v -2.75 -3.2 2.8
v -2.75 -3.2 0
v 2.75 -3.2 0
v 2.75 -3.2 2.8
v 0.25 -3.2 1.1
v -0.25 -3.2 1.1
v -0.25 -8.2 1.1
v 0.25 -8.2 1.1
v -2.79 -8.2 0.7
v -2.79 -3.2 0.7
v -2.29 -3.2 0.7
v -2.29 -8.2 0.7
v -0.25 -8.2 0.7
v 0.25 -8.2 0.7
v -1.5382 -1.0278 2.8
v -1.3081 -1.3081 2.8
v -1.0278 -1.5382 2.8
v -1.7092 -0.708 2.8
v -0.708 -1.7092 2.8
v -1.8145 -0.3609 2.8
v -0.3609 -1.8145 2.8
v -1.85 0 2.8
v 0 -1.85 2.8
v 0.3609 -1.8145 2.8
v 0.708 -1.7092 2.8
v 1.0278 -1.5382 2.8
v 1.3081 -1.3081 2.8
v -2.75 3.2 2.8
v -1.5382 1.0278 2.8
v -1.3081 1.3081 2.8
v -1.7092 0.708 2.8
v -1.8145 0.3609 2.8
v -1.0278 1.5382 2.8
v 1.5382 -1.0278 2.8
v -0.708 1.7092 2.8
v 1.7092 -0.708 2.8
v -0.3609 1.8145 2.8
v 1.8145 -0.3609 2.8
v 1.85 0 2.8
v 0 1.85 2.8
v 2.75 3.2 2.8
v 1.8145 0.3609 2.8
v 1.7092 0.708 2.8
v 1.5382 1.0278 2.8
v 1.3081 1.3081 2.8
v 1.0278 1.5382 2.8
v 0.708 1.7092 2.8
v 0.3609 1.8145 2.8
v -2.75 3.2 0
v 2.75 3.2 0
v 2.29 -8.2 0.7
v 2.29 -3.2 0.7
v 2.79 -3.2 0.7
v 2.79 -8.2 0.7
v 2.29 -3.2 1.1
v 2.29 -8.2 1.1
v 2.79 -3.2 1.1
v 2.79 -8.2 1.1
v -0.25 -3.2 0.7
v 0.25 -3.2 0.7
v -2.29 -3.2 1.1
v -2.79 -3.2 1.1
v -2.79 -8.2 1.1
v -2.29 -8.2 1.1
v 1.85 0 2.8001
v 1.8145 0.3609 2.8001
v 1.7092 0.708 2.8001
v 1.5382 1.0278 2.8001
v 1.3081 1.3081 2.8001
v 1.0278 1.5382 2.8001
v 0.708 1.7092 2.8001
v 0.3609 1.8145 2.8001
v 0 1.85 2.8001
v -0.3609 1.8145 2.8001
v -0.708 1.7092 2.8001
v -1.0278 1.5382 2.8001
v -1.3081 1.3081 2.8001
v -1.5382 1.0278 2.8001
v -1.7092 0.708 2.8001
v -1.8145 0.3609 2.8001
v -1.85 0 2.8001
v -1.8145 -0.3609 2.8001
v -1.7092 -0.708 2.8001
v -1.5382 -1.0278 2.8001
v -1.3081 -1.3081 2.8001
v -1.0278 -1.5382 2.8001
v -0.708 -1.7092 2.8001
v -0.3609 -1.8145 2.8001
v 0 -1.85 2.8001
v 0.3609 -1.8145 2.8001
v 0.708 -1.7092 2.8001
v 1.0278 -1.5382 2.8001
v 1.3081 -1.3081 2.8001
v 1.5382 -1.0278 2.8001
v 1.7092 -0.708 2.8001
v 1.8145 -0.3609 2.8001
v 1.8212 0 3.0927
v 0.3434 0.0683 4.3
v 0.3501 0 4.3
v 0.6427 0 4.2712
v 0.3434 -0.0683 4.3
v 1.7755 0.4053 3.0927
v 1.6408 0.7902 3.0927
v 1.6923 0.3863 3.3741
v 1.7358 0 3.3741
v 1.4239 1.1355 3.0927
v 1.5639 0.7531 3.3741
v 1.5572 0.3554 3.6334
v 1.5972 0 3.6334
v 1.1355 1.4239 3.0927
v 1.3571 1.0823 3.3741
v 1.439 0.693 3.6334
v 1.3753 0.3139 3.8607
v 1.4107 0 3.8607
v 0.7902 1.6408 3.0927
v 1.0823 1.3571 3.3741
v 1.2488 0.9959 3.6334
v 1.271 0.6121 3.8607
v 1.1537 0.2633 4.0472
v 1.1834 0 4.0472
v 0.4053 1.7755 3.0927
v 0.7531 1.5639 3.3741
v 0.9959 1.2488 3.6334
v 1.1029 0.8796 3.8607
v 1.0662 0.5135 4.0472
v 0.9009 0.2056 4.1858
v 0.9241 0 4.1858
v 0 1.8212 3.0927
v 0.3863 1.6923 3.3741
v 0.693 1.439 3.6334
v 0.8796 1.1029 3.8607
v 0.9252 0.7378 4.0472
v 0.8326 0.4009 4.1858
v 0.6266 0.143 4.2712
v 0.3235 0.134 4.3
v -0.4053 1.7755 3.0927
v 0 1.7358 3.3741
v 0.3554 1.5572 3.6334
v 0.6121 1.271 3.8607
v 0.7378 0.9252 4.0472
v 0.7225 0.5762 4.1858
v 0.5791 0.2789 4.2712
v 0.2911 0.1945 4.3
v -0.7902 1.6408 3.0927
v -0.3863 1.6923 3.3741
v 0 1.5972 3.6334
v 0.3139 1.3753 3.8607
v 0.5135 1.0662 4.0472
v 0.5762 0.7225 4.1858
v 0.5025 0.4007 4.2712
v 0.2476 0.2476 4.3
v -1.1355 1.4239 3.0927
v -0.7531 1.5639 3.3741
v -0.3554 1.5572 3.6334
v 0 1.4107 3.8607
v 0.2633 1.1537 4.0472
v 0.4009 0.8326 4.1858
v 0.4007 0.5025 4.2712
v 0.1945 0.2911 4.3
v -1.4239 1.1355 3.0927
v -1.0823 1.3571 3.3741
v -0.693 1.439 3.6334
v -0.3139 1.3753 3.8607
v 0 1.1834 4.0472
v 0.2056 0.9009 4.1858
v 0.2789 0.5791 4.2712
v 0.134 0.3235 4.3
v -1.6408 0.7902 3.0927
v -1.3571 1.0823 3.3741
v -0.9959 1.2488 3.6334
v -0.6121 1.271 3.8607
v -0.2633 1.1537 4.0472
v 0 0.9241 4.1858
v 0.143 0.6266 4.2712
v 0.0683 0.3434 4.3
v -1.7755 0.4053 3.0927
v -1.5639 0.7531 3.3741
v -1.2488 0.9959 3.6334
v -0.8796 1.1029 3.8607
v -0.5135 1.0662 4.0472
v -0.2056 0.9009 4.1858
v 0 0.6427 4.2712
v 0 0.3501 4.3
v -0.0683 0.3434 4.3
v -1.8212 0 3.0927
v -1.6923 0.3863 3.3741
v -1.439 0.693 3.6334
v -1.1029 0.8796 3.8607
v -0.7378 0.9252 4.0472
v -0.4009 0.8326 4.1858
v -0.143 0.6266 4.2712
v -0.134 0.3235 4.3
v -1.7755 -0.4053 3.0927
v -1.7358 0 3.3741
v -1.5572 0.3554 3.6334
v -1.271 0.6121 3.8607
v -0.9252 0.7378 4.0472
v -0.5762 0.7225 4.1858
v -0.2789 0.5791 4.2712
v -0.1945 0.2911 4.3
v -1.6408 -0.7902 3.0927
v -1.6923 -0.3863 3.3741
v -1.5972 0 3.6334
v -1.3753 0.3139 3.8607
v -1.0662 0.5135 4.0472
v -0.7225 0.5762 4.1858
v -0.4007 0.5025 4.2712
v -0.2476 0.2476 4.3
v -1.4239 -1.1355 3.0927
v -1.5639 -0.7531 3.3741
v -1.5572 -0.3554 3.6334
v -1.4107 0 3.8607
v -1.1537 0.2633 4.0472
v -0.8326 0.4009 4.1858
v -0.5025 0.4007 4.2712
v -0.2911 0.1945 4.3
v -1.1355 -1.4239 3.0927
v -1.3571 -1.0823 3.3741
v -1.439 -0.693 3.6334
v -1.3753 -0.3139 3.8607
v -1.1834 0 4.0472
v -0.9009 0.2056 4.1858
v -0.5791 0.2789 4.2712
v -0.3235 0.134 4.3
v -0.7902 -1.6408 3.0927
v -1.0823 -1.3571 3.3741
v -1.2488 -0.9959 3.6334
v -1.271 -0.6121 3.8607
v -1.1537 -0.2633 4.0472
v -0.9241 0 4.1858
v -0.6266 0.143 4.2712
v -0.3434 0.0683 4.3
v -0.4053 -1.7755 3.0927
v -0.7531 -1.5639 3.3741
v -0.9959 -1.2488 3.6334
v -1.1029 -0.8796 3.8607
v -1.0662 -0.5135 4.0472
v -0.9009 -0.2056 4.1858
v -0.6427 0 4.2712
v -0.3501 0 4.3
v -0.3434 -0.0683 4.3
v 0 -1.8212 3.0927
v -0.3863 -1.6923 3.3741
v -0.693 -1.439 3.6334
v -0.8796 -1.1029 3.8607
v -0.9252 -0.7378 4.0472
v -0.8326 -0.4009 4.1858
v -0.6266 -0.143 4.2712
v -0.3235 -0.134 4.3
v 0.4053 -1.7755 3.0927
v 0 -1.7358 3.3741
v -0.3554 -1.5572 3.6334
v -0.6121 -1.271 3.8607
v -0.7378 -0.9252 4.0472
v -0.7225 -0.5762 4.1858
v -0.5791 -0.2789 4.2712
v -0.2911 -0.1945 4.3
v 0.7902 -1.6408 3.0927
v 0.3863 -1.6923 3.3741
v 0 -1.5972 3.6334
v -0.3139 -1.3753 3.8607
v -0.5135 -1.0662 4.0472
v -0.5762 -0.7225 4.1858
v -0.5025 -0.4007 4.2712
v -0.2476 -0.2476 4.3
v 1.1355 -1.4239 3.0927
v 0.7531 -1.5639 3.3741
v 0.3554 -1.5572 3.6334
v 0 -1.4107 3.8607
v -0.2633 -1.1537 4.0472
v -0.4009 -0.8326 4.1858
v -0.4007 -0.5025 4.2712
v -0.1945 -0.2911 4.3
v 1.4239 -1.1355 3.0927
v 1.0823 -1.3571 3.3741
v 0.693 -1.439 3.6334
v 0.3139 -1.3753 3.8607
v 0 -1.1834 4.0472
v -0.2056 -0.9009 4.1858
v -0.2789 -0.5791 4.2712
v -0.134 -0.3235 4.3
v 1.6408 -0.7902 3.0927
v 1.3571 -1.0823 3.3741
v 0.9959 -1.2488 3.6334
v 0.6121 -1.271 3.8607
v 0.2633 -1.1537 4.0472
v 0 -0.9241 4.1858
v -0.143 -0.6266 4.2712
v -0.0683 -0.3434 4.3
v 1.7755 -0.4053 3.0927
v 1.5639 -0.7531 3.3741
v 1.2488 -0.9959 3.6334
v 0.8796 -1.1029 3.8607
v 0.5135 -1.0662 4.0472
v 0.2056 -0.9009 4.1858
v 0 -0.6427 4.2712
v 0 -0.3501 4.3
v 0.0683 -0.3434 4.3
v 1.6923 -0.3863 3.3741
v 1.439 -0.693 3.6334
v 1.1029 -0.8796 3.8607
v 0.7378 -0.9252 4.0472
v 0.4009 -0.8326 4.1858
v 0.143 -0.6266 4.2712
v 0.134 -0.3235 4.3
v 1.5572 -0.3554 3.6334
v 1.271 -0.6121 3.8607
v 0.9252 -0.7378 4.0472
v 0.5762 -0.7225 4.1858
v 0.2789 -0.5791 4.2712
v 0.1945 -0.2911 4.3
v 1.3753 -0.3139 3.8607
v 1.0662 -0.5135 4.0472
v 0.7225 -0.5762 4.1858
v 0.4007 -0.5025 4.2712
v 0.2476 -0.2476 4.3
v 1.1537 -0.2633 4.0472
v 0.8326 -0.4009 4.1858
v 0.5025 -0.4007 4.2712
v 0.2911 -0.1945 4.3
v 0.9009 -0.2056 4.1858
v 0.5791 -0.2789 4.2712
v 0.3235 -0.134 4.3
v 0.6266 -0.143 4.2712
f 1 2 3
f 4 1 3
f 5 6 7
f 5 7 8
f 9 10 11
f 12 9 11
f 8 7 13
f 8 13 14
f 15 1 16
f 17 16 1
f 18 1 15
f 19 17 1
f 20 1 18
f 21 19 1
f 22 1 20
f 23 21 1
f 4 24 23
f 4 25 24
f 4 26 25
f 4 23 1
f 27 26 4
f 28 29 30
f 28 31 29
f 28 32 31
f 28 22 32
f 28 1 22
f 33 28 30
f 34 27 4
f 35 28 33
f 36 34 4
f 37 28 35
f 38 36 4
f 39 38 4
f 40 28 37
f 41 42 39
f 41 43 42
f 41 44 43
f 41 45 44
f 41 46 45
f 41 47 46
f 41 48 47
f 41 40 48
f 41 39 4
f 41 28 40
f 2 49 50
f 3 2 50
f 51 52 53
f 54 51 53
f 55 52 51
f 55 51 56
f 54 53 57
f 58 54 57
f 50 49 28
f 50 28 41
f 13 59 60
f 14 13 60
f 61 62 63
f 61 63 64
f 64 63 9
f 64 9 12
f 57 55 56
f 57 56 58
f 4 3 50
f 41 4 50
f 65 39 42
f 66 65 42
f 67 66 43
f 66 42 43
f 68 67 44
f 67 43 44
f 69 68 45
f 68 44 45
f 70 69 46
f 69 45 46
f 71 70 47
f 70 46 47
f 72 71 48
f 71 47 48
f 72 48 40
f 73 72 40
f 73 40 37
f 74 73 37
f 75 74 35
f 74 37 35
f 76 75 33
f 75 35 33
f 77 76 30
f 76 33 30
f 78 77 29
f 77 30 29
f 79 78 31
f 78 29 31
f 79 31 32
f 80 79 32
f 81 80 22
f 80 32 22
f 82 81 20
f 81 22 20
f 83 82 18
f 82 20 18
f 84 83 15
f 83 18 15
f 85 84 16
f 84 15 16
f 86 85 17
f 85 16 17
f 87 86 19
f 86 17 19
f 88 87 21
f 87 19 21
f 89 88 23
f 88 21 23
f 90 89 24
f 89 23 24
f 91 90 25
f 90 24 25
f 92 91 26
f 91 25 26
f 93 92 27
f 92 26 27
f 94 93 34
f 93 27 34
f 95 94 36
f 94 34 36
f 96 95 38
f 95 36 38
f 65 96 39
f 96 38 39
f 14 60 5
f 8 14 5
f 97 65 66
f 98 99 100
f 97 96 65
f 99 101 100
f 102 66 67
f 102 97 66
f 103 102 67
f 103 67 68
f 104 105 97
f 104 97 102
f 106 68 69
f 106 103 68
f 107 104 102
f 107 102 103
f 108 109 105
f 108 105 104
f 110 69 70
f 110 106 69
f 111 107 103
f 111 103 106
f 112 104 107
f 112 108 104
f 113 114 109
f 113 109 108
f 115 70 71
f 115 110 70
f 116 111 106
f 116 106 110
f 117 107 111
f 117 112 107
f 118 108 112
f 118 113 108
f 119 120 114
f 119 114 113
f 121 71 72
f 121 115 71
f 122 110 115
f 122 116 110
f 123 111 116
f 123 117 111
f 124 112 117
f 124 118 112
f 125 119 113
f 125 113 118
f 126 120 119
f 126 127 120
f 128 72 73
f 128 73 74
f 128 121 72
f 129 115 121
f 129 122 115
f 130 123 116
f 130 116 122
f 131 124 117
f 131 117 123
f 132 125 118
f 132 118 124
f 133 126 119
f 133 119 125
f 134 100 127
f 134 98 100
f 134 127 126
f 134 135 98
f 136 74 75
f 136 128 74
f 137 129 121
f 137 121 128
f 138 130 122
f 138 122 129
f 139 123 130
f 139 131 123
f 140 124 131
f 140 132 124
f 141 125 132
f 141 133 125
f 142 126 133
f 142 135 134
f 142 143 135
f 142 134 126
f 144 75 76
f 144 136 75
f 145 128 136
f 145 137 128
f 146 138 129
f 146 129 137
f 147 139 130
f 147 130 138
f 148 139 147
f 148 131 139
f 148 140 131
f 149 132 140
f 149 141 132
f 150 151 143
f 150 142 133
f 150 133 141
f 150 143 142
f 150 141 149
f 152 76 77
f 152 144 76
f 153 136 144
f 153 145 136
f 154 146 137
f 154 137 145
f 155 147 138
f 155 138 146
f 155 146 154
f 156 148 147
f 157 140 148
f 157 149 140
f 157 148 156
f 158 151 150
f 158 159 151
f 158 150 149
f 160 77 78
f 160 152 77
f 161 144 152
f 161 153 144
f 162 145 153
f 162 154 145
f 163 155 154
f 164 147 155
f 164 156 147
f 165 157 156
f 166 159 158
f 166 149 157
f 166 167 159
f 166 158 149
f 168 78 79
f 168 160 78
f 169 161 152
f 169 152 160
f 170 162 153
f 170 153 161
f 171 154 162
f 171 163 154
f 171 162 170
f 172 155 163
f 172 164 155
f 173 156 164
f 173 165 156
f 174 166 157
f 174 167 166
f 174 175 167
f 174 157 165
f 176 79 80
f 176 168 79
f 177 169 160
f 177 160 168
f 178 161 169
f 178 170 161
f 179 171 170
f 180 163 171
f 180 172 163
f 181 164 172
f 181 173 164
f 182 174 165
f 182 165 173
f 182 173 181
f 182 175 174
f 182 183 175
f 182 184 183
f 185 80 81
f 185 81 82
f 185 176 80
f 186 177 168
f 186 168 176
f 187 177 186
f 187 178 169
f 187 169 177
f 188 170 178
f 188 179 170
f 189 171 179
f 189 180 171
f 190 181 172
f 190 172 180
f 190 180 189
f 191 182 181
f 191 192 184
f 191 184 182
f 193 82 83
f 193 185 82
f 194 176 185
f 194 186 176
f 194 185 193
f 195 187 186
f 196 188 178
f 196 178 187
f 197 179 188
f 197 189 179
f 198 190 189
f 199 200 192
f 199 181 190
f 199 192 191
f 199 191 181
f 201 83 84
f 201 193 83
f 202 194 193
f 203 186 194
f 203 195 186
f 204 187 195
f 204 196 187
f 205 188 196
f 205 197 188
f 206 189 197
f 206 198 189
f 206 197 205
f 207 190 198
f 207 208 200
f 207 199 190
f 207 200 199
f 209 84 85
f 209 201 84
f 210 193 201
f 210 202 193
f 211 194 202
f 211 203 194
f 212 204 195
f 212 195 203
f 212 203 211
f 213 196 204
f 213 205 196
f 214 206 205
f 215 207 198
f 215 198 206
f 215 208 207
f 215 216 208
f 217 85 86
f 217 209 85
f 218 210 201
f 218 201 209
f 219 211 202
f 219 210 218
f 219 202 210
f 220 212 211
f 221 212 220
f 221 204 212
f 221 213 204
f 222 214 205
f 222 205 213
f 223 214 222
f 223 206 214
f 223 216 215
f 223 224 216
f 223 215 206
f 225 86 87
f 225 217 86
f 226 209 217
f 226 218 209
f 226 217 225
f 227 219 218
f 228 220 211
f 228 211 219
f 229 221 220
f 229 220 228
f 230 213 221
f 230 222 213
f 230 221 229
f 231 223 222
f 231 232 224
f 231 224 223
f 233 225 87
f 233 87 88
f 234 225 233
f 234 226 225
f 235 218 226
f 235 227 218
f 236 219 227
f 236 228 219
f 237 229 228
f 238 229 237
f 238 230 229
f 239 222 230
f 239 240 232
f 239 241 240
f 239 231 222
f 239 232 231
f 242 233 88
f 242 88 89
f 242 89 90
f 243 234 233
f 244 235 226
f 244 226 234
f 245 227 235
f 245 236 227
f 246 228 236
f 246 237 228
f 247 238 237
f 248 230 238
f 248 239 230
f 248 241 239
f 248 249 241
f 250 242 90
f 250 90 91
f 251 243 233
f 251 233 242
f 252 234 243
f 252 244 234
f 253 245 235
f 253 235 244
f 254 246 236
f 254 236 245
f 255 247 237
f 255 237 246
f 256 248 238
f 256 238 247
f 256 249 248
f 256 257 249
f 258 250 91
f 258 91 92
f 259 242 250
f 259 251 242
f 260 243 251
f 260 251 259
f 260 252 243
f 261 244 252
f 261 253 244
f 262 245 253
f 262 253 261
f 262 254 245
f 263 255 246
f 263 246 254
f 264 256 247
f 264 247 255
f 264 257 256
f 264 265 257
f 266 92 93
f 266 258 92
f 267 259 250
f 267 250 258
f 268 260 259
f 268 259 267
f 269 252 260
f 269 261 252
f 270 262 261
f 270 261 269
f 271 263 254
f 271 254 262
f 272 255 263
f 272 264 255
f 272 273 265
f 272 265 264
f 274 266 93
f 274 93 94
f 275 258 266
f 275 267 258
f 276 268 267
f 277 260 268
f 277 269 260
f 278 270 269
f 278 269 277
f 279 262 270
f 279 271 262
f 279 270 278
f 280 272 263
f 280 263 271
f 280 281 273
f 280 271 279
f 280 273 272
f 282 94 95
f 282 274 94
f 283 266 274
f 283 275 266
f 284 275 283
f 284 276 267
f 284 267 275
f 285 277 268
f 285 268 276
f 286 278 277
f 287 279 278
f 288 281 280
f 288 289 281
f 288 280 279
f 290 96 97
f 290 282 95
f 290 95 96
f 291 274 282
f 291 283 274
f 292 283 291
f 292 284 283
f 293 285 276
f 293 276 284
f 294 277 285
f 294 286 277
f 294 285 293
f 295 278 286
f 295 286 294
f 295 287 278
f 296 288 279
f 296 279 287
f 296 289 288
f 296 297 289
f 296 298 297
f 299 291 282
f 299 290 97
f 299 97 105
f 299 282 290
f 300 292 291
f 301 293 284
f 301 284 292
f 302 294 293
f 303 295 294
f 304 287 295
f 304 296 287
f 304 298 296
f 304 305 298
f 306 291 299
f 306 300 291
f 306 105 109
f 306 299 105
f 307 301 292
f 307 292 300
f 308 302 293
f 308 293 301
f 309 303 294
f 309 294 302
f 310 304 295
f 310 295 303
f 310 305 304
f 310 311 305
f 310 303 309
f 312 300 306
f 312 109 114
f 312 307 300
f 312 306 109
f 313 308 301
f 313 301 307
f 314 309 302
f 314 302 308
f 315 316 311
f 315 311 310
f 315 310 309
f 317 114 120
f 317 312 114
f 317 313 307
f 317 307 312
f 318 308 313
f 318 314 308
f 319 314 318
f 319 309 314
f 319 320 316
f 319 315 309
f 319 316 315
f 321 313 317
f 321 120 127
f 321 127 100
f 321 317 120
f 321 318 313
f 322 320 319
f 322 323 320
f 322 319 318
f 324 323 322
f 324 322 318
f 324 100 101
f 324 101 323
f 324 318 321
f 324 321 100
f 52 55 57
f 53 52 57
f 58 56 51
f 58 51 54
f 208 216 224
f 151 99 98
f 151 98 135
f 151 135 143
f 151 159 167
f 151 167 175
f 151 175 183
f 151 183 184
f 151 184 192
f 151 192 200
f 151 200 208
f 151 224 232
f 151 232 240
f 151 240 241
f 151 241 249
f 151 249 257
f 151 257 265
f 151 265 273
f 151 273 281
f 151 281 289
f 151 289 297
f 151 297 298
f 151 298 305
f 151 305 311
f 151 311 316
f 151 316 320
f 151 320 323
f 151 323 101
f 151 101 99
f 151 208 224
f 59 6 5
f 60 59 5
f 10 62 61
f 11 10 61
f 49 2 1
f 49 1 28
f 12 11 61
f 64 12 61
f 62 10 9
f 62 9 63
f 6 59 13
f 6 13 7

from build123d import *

# Parameters (mm, degrees)
SKETCH_1_W        = 5.5
SKETCH_1_H        = 6.4
EXTRUDE_1_DEPTH   = 2.8
SKETCH_3_R        = 1.85
EXTRUDE_2_DEPTH   = 1.5
FILLET_1_R        = 1.5
SKETCH_2_W        = 0.5
SKETCH_2_H        = 0.4
EXTRUDE_3_DEPTH   = 5
EXTRUDE_3_2_DEPTH = 5
EXTRUDE_3_3_DEPTH = 5


with BuildPart() as part:
    # 草图1 → 凸台-拉伸1 (new body)
    with BuildSketch(Plane.XY):
        Rectangle(SKETCH_1_W, SKETCH_1_H)
    extrude(amount=EXTRUDE_1_DEPTH)

    # 草图3 → 凸台-拉伸2 (add)
    with BuildSketch(Plane.XY.offset(2.8)):
        Circle(SKETCH_3_R)
    extrude(amount=EXTRUDE_2_DEPTH)

    # 圆角1
    fillet_1_edges = [part.edges().sort_by_distance(p)[0] for p in [
        (-1.85, 0, 4.3),
    ]]
    fillet(fillet_1_edges, radius=FILLET_1_R - 0.0001)  # a hair under: the kernel refuses the full size


with BuildPart() as body_2:
    # 草图2 → 凸台-拉伸3 (new body)
    with BuildSketch(Plane.XZ.offset(3.2)):
        with Locations((0, 0.9)):
            Rectangle(SKETCH_2_W, SKETCH_2_H)
    extrude(amount=EXTRUDE_3_DEPTH)


with BuildPart() as body_3:
    # 草图2 → Extrude 3 2 (new body)
    with BuildSketch(Plane.XZ.offset(3.2)):
        with Locations((-2.54, 0.9)):
            Rectangle(SKETCH_2_W, SKETCH_2_H)
    extrude(amount=EXTRUDE_3_2_DEPTH)


with BuildPart() as body_4:
    # 草图2 → Extrude 3 3 (new body)
    with BuildSketch(Plane.XZ.offset(3.2)):
        with Locations((2.54, 0.9)):
            Rectangle(SKETCH_2_W, SKETCH_2_H)
    extrude(amount=EXTRUDE_3_3_DEPTH)


solid = Compound([part.part, body_2.part, body_3.part, body_4.part])
